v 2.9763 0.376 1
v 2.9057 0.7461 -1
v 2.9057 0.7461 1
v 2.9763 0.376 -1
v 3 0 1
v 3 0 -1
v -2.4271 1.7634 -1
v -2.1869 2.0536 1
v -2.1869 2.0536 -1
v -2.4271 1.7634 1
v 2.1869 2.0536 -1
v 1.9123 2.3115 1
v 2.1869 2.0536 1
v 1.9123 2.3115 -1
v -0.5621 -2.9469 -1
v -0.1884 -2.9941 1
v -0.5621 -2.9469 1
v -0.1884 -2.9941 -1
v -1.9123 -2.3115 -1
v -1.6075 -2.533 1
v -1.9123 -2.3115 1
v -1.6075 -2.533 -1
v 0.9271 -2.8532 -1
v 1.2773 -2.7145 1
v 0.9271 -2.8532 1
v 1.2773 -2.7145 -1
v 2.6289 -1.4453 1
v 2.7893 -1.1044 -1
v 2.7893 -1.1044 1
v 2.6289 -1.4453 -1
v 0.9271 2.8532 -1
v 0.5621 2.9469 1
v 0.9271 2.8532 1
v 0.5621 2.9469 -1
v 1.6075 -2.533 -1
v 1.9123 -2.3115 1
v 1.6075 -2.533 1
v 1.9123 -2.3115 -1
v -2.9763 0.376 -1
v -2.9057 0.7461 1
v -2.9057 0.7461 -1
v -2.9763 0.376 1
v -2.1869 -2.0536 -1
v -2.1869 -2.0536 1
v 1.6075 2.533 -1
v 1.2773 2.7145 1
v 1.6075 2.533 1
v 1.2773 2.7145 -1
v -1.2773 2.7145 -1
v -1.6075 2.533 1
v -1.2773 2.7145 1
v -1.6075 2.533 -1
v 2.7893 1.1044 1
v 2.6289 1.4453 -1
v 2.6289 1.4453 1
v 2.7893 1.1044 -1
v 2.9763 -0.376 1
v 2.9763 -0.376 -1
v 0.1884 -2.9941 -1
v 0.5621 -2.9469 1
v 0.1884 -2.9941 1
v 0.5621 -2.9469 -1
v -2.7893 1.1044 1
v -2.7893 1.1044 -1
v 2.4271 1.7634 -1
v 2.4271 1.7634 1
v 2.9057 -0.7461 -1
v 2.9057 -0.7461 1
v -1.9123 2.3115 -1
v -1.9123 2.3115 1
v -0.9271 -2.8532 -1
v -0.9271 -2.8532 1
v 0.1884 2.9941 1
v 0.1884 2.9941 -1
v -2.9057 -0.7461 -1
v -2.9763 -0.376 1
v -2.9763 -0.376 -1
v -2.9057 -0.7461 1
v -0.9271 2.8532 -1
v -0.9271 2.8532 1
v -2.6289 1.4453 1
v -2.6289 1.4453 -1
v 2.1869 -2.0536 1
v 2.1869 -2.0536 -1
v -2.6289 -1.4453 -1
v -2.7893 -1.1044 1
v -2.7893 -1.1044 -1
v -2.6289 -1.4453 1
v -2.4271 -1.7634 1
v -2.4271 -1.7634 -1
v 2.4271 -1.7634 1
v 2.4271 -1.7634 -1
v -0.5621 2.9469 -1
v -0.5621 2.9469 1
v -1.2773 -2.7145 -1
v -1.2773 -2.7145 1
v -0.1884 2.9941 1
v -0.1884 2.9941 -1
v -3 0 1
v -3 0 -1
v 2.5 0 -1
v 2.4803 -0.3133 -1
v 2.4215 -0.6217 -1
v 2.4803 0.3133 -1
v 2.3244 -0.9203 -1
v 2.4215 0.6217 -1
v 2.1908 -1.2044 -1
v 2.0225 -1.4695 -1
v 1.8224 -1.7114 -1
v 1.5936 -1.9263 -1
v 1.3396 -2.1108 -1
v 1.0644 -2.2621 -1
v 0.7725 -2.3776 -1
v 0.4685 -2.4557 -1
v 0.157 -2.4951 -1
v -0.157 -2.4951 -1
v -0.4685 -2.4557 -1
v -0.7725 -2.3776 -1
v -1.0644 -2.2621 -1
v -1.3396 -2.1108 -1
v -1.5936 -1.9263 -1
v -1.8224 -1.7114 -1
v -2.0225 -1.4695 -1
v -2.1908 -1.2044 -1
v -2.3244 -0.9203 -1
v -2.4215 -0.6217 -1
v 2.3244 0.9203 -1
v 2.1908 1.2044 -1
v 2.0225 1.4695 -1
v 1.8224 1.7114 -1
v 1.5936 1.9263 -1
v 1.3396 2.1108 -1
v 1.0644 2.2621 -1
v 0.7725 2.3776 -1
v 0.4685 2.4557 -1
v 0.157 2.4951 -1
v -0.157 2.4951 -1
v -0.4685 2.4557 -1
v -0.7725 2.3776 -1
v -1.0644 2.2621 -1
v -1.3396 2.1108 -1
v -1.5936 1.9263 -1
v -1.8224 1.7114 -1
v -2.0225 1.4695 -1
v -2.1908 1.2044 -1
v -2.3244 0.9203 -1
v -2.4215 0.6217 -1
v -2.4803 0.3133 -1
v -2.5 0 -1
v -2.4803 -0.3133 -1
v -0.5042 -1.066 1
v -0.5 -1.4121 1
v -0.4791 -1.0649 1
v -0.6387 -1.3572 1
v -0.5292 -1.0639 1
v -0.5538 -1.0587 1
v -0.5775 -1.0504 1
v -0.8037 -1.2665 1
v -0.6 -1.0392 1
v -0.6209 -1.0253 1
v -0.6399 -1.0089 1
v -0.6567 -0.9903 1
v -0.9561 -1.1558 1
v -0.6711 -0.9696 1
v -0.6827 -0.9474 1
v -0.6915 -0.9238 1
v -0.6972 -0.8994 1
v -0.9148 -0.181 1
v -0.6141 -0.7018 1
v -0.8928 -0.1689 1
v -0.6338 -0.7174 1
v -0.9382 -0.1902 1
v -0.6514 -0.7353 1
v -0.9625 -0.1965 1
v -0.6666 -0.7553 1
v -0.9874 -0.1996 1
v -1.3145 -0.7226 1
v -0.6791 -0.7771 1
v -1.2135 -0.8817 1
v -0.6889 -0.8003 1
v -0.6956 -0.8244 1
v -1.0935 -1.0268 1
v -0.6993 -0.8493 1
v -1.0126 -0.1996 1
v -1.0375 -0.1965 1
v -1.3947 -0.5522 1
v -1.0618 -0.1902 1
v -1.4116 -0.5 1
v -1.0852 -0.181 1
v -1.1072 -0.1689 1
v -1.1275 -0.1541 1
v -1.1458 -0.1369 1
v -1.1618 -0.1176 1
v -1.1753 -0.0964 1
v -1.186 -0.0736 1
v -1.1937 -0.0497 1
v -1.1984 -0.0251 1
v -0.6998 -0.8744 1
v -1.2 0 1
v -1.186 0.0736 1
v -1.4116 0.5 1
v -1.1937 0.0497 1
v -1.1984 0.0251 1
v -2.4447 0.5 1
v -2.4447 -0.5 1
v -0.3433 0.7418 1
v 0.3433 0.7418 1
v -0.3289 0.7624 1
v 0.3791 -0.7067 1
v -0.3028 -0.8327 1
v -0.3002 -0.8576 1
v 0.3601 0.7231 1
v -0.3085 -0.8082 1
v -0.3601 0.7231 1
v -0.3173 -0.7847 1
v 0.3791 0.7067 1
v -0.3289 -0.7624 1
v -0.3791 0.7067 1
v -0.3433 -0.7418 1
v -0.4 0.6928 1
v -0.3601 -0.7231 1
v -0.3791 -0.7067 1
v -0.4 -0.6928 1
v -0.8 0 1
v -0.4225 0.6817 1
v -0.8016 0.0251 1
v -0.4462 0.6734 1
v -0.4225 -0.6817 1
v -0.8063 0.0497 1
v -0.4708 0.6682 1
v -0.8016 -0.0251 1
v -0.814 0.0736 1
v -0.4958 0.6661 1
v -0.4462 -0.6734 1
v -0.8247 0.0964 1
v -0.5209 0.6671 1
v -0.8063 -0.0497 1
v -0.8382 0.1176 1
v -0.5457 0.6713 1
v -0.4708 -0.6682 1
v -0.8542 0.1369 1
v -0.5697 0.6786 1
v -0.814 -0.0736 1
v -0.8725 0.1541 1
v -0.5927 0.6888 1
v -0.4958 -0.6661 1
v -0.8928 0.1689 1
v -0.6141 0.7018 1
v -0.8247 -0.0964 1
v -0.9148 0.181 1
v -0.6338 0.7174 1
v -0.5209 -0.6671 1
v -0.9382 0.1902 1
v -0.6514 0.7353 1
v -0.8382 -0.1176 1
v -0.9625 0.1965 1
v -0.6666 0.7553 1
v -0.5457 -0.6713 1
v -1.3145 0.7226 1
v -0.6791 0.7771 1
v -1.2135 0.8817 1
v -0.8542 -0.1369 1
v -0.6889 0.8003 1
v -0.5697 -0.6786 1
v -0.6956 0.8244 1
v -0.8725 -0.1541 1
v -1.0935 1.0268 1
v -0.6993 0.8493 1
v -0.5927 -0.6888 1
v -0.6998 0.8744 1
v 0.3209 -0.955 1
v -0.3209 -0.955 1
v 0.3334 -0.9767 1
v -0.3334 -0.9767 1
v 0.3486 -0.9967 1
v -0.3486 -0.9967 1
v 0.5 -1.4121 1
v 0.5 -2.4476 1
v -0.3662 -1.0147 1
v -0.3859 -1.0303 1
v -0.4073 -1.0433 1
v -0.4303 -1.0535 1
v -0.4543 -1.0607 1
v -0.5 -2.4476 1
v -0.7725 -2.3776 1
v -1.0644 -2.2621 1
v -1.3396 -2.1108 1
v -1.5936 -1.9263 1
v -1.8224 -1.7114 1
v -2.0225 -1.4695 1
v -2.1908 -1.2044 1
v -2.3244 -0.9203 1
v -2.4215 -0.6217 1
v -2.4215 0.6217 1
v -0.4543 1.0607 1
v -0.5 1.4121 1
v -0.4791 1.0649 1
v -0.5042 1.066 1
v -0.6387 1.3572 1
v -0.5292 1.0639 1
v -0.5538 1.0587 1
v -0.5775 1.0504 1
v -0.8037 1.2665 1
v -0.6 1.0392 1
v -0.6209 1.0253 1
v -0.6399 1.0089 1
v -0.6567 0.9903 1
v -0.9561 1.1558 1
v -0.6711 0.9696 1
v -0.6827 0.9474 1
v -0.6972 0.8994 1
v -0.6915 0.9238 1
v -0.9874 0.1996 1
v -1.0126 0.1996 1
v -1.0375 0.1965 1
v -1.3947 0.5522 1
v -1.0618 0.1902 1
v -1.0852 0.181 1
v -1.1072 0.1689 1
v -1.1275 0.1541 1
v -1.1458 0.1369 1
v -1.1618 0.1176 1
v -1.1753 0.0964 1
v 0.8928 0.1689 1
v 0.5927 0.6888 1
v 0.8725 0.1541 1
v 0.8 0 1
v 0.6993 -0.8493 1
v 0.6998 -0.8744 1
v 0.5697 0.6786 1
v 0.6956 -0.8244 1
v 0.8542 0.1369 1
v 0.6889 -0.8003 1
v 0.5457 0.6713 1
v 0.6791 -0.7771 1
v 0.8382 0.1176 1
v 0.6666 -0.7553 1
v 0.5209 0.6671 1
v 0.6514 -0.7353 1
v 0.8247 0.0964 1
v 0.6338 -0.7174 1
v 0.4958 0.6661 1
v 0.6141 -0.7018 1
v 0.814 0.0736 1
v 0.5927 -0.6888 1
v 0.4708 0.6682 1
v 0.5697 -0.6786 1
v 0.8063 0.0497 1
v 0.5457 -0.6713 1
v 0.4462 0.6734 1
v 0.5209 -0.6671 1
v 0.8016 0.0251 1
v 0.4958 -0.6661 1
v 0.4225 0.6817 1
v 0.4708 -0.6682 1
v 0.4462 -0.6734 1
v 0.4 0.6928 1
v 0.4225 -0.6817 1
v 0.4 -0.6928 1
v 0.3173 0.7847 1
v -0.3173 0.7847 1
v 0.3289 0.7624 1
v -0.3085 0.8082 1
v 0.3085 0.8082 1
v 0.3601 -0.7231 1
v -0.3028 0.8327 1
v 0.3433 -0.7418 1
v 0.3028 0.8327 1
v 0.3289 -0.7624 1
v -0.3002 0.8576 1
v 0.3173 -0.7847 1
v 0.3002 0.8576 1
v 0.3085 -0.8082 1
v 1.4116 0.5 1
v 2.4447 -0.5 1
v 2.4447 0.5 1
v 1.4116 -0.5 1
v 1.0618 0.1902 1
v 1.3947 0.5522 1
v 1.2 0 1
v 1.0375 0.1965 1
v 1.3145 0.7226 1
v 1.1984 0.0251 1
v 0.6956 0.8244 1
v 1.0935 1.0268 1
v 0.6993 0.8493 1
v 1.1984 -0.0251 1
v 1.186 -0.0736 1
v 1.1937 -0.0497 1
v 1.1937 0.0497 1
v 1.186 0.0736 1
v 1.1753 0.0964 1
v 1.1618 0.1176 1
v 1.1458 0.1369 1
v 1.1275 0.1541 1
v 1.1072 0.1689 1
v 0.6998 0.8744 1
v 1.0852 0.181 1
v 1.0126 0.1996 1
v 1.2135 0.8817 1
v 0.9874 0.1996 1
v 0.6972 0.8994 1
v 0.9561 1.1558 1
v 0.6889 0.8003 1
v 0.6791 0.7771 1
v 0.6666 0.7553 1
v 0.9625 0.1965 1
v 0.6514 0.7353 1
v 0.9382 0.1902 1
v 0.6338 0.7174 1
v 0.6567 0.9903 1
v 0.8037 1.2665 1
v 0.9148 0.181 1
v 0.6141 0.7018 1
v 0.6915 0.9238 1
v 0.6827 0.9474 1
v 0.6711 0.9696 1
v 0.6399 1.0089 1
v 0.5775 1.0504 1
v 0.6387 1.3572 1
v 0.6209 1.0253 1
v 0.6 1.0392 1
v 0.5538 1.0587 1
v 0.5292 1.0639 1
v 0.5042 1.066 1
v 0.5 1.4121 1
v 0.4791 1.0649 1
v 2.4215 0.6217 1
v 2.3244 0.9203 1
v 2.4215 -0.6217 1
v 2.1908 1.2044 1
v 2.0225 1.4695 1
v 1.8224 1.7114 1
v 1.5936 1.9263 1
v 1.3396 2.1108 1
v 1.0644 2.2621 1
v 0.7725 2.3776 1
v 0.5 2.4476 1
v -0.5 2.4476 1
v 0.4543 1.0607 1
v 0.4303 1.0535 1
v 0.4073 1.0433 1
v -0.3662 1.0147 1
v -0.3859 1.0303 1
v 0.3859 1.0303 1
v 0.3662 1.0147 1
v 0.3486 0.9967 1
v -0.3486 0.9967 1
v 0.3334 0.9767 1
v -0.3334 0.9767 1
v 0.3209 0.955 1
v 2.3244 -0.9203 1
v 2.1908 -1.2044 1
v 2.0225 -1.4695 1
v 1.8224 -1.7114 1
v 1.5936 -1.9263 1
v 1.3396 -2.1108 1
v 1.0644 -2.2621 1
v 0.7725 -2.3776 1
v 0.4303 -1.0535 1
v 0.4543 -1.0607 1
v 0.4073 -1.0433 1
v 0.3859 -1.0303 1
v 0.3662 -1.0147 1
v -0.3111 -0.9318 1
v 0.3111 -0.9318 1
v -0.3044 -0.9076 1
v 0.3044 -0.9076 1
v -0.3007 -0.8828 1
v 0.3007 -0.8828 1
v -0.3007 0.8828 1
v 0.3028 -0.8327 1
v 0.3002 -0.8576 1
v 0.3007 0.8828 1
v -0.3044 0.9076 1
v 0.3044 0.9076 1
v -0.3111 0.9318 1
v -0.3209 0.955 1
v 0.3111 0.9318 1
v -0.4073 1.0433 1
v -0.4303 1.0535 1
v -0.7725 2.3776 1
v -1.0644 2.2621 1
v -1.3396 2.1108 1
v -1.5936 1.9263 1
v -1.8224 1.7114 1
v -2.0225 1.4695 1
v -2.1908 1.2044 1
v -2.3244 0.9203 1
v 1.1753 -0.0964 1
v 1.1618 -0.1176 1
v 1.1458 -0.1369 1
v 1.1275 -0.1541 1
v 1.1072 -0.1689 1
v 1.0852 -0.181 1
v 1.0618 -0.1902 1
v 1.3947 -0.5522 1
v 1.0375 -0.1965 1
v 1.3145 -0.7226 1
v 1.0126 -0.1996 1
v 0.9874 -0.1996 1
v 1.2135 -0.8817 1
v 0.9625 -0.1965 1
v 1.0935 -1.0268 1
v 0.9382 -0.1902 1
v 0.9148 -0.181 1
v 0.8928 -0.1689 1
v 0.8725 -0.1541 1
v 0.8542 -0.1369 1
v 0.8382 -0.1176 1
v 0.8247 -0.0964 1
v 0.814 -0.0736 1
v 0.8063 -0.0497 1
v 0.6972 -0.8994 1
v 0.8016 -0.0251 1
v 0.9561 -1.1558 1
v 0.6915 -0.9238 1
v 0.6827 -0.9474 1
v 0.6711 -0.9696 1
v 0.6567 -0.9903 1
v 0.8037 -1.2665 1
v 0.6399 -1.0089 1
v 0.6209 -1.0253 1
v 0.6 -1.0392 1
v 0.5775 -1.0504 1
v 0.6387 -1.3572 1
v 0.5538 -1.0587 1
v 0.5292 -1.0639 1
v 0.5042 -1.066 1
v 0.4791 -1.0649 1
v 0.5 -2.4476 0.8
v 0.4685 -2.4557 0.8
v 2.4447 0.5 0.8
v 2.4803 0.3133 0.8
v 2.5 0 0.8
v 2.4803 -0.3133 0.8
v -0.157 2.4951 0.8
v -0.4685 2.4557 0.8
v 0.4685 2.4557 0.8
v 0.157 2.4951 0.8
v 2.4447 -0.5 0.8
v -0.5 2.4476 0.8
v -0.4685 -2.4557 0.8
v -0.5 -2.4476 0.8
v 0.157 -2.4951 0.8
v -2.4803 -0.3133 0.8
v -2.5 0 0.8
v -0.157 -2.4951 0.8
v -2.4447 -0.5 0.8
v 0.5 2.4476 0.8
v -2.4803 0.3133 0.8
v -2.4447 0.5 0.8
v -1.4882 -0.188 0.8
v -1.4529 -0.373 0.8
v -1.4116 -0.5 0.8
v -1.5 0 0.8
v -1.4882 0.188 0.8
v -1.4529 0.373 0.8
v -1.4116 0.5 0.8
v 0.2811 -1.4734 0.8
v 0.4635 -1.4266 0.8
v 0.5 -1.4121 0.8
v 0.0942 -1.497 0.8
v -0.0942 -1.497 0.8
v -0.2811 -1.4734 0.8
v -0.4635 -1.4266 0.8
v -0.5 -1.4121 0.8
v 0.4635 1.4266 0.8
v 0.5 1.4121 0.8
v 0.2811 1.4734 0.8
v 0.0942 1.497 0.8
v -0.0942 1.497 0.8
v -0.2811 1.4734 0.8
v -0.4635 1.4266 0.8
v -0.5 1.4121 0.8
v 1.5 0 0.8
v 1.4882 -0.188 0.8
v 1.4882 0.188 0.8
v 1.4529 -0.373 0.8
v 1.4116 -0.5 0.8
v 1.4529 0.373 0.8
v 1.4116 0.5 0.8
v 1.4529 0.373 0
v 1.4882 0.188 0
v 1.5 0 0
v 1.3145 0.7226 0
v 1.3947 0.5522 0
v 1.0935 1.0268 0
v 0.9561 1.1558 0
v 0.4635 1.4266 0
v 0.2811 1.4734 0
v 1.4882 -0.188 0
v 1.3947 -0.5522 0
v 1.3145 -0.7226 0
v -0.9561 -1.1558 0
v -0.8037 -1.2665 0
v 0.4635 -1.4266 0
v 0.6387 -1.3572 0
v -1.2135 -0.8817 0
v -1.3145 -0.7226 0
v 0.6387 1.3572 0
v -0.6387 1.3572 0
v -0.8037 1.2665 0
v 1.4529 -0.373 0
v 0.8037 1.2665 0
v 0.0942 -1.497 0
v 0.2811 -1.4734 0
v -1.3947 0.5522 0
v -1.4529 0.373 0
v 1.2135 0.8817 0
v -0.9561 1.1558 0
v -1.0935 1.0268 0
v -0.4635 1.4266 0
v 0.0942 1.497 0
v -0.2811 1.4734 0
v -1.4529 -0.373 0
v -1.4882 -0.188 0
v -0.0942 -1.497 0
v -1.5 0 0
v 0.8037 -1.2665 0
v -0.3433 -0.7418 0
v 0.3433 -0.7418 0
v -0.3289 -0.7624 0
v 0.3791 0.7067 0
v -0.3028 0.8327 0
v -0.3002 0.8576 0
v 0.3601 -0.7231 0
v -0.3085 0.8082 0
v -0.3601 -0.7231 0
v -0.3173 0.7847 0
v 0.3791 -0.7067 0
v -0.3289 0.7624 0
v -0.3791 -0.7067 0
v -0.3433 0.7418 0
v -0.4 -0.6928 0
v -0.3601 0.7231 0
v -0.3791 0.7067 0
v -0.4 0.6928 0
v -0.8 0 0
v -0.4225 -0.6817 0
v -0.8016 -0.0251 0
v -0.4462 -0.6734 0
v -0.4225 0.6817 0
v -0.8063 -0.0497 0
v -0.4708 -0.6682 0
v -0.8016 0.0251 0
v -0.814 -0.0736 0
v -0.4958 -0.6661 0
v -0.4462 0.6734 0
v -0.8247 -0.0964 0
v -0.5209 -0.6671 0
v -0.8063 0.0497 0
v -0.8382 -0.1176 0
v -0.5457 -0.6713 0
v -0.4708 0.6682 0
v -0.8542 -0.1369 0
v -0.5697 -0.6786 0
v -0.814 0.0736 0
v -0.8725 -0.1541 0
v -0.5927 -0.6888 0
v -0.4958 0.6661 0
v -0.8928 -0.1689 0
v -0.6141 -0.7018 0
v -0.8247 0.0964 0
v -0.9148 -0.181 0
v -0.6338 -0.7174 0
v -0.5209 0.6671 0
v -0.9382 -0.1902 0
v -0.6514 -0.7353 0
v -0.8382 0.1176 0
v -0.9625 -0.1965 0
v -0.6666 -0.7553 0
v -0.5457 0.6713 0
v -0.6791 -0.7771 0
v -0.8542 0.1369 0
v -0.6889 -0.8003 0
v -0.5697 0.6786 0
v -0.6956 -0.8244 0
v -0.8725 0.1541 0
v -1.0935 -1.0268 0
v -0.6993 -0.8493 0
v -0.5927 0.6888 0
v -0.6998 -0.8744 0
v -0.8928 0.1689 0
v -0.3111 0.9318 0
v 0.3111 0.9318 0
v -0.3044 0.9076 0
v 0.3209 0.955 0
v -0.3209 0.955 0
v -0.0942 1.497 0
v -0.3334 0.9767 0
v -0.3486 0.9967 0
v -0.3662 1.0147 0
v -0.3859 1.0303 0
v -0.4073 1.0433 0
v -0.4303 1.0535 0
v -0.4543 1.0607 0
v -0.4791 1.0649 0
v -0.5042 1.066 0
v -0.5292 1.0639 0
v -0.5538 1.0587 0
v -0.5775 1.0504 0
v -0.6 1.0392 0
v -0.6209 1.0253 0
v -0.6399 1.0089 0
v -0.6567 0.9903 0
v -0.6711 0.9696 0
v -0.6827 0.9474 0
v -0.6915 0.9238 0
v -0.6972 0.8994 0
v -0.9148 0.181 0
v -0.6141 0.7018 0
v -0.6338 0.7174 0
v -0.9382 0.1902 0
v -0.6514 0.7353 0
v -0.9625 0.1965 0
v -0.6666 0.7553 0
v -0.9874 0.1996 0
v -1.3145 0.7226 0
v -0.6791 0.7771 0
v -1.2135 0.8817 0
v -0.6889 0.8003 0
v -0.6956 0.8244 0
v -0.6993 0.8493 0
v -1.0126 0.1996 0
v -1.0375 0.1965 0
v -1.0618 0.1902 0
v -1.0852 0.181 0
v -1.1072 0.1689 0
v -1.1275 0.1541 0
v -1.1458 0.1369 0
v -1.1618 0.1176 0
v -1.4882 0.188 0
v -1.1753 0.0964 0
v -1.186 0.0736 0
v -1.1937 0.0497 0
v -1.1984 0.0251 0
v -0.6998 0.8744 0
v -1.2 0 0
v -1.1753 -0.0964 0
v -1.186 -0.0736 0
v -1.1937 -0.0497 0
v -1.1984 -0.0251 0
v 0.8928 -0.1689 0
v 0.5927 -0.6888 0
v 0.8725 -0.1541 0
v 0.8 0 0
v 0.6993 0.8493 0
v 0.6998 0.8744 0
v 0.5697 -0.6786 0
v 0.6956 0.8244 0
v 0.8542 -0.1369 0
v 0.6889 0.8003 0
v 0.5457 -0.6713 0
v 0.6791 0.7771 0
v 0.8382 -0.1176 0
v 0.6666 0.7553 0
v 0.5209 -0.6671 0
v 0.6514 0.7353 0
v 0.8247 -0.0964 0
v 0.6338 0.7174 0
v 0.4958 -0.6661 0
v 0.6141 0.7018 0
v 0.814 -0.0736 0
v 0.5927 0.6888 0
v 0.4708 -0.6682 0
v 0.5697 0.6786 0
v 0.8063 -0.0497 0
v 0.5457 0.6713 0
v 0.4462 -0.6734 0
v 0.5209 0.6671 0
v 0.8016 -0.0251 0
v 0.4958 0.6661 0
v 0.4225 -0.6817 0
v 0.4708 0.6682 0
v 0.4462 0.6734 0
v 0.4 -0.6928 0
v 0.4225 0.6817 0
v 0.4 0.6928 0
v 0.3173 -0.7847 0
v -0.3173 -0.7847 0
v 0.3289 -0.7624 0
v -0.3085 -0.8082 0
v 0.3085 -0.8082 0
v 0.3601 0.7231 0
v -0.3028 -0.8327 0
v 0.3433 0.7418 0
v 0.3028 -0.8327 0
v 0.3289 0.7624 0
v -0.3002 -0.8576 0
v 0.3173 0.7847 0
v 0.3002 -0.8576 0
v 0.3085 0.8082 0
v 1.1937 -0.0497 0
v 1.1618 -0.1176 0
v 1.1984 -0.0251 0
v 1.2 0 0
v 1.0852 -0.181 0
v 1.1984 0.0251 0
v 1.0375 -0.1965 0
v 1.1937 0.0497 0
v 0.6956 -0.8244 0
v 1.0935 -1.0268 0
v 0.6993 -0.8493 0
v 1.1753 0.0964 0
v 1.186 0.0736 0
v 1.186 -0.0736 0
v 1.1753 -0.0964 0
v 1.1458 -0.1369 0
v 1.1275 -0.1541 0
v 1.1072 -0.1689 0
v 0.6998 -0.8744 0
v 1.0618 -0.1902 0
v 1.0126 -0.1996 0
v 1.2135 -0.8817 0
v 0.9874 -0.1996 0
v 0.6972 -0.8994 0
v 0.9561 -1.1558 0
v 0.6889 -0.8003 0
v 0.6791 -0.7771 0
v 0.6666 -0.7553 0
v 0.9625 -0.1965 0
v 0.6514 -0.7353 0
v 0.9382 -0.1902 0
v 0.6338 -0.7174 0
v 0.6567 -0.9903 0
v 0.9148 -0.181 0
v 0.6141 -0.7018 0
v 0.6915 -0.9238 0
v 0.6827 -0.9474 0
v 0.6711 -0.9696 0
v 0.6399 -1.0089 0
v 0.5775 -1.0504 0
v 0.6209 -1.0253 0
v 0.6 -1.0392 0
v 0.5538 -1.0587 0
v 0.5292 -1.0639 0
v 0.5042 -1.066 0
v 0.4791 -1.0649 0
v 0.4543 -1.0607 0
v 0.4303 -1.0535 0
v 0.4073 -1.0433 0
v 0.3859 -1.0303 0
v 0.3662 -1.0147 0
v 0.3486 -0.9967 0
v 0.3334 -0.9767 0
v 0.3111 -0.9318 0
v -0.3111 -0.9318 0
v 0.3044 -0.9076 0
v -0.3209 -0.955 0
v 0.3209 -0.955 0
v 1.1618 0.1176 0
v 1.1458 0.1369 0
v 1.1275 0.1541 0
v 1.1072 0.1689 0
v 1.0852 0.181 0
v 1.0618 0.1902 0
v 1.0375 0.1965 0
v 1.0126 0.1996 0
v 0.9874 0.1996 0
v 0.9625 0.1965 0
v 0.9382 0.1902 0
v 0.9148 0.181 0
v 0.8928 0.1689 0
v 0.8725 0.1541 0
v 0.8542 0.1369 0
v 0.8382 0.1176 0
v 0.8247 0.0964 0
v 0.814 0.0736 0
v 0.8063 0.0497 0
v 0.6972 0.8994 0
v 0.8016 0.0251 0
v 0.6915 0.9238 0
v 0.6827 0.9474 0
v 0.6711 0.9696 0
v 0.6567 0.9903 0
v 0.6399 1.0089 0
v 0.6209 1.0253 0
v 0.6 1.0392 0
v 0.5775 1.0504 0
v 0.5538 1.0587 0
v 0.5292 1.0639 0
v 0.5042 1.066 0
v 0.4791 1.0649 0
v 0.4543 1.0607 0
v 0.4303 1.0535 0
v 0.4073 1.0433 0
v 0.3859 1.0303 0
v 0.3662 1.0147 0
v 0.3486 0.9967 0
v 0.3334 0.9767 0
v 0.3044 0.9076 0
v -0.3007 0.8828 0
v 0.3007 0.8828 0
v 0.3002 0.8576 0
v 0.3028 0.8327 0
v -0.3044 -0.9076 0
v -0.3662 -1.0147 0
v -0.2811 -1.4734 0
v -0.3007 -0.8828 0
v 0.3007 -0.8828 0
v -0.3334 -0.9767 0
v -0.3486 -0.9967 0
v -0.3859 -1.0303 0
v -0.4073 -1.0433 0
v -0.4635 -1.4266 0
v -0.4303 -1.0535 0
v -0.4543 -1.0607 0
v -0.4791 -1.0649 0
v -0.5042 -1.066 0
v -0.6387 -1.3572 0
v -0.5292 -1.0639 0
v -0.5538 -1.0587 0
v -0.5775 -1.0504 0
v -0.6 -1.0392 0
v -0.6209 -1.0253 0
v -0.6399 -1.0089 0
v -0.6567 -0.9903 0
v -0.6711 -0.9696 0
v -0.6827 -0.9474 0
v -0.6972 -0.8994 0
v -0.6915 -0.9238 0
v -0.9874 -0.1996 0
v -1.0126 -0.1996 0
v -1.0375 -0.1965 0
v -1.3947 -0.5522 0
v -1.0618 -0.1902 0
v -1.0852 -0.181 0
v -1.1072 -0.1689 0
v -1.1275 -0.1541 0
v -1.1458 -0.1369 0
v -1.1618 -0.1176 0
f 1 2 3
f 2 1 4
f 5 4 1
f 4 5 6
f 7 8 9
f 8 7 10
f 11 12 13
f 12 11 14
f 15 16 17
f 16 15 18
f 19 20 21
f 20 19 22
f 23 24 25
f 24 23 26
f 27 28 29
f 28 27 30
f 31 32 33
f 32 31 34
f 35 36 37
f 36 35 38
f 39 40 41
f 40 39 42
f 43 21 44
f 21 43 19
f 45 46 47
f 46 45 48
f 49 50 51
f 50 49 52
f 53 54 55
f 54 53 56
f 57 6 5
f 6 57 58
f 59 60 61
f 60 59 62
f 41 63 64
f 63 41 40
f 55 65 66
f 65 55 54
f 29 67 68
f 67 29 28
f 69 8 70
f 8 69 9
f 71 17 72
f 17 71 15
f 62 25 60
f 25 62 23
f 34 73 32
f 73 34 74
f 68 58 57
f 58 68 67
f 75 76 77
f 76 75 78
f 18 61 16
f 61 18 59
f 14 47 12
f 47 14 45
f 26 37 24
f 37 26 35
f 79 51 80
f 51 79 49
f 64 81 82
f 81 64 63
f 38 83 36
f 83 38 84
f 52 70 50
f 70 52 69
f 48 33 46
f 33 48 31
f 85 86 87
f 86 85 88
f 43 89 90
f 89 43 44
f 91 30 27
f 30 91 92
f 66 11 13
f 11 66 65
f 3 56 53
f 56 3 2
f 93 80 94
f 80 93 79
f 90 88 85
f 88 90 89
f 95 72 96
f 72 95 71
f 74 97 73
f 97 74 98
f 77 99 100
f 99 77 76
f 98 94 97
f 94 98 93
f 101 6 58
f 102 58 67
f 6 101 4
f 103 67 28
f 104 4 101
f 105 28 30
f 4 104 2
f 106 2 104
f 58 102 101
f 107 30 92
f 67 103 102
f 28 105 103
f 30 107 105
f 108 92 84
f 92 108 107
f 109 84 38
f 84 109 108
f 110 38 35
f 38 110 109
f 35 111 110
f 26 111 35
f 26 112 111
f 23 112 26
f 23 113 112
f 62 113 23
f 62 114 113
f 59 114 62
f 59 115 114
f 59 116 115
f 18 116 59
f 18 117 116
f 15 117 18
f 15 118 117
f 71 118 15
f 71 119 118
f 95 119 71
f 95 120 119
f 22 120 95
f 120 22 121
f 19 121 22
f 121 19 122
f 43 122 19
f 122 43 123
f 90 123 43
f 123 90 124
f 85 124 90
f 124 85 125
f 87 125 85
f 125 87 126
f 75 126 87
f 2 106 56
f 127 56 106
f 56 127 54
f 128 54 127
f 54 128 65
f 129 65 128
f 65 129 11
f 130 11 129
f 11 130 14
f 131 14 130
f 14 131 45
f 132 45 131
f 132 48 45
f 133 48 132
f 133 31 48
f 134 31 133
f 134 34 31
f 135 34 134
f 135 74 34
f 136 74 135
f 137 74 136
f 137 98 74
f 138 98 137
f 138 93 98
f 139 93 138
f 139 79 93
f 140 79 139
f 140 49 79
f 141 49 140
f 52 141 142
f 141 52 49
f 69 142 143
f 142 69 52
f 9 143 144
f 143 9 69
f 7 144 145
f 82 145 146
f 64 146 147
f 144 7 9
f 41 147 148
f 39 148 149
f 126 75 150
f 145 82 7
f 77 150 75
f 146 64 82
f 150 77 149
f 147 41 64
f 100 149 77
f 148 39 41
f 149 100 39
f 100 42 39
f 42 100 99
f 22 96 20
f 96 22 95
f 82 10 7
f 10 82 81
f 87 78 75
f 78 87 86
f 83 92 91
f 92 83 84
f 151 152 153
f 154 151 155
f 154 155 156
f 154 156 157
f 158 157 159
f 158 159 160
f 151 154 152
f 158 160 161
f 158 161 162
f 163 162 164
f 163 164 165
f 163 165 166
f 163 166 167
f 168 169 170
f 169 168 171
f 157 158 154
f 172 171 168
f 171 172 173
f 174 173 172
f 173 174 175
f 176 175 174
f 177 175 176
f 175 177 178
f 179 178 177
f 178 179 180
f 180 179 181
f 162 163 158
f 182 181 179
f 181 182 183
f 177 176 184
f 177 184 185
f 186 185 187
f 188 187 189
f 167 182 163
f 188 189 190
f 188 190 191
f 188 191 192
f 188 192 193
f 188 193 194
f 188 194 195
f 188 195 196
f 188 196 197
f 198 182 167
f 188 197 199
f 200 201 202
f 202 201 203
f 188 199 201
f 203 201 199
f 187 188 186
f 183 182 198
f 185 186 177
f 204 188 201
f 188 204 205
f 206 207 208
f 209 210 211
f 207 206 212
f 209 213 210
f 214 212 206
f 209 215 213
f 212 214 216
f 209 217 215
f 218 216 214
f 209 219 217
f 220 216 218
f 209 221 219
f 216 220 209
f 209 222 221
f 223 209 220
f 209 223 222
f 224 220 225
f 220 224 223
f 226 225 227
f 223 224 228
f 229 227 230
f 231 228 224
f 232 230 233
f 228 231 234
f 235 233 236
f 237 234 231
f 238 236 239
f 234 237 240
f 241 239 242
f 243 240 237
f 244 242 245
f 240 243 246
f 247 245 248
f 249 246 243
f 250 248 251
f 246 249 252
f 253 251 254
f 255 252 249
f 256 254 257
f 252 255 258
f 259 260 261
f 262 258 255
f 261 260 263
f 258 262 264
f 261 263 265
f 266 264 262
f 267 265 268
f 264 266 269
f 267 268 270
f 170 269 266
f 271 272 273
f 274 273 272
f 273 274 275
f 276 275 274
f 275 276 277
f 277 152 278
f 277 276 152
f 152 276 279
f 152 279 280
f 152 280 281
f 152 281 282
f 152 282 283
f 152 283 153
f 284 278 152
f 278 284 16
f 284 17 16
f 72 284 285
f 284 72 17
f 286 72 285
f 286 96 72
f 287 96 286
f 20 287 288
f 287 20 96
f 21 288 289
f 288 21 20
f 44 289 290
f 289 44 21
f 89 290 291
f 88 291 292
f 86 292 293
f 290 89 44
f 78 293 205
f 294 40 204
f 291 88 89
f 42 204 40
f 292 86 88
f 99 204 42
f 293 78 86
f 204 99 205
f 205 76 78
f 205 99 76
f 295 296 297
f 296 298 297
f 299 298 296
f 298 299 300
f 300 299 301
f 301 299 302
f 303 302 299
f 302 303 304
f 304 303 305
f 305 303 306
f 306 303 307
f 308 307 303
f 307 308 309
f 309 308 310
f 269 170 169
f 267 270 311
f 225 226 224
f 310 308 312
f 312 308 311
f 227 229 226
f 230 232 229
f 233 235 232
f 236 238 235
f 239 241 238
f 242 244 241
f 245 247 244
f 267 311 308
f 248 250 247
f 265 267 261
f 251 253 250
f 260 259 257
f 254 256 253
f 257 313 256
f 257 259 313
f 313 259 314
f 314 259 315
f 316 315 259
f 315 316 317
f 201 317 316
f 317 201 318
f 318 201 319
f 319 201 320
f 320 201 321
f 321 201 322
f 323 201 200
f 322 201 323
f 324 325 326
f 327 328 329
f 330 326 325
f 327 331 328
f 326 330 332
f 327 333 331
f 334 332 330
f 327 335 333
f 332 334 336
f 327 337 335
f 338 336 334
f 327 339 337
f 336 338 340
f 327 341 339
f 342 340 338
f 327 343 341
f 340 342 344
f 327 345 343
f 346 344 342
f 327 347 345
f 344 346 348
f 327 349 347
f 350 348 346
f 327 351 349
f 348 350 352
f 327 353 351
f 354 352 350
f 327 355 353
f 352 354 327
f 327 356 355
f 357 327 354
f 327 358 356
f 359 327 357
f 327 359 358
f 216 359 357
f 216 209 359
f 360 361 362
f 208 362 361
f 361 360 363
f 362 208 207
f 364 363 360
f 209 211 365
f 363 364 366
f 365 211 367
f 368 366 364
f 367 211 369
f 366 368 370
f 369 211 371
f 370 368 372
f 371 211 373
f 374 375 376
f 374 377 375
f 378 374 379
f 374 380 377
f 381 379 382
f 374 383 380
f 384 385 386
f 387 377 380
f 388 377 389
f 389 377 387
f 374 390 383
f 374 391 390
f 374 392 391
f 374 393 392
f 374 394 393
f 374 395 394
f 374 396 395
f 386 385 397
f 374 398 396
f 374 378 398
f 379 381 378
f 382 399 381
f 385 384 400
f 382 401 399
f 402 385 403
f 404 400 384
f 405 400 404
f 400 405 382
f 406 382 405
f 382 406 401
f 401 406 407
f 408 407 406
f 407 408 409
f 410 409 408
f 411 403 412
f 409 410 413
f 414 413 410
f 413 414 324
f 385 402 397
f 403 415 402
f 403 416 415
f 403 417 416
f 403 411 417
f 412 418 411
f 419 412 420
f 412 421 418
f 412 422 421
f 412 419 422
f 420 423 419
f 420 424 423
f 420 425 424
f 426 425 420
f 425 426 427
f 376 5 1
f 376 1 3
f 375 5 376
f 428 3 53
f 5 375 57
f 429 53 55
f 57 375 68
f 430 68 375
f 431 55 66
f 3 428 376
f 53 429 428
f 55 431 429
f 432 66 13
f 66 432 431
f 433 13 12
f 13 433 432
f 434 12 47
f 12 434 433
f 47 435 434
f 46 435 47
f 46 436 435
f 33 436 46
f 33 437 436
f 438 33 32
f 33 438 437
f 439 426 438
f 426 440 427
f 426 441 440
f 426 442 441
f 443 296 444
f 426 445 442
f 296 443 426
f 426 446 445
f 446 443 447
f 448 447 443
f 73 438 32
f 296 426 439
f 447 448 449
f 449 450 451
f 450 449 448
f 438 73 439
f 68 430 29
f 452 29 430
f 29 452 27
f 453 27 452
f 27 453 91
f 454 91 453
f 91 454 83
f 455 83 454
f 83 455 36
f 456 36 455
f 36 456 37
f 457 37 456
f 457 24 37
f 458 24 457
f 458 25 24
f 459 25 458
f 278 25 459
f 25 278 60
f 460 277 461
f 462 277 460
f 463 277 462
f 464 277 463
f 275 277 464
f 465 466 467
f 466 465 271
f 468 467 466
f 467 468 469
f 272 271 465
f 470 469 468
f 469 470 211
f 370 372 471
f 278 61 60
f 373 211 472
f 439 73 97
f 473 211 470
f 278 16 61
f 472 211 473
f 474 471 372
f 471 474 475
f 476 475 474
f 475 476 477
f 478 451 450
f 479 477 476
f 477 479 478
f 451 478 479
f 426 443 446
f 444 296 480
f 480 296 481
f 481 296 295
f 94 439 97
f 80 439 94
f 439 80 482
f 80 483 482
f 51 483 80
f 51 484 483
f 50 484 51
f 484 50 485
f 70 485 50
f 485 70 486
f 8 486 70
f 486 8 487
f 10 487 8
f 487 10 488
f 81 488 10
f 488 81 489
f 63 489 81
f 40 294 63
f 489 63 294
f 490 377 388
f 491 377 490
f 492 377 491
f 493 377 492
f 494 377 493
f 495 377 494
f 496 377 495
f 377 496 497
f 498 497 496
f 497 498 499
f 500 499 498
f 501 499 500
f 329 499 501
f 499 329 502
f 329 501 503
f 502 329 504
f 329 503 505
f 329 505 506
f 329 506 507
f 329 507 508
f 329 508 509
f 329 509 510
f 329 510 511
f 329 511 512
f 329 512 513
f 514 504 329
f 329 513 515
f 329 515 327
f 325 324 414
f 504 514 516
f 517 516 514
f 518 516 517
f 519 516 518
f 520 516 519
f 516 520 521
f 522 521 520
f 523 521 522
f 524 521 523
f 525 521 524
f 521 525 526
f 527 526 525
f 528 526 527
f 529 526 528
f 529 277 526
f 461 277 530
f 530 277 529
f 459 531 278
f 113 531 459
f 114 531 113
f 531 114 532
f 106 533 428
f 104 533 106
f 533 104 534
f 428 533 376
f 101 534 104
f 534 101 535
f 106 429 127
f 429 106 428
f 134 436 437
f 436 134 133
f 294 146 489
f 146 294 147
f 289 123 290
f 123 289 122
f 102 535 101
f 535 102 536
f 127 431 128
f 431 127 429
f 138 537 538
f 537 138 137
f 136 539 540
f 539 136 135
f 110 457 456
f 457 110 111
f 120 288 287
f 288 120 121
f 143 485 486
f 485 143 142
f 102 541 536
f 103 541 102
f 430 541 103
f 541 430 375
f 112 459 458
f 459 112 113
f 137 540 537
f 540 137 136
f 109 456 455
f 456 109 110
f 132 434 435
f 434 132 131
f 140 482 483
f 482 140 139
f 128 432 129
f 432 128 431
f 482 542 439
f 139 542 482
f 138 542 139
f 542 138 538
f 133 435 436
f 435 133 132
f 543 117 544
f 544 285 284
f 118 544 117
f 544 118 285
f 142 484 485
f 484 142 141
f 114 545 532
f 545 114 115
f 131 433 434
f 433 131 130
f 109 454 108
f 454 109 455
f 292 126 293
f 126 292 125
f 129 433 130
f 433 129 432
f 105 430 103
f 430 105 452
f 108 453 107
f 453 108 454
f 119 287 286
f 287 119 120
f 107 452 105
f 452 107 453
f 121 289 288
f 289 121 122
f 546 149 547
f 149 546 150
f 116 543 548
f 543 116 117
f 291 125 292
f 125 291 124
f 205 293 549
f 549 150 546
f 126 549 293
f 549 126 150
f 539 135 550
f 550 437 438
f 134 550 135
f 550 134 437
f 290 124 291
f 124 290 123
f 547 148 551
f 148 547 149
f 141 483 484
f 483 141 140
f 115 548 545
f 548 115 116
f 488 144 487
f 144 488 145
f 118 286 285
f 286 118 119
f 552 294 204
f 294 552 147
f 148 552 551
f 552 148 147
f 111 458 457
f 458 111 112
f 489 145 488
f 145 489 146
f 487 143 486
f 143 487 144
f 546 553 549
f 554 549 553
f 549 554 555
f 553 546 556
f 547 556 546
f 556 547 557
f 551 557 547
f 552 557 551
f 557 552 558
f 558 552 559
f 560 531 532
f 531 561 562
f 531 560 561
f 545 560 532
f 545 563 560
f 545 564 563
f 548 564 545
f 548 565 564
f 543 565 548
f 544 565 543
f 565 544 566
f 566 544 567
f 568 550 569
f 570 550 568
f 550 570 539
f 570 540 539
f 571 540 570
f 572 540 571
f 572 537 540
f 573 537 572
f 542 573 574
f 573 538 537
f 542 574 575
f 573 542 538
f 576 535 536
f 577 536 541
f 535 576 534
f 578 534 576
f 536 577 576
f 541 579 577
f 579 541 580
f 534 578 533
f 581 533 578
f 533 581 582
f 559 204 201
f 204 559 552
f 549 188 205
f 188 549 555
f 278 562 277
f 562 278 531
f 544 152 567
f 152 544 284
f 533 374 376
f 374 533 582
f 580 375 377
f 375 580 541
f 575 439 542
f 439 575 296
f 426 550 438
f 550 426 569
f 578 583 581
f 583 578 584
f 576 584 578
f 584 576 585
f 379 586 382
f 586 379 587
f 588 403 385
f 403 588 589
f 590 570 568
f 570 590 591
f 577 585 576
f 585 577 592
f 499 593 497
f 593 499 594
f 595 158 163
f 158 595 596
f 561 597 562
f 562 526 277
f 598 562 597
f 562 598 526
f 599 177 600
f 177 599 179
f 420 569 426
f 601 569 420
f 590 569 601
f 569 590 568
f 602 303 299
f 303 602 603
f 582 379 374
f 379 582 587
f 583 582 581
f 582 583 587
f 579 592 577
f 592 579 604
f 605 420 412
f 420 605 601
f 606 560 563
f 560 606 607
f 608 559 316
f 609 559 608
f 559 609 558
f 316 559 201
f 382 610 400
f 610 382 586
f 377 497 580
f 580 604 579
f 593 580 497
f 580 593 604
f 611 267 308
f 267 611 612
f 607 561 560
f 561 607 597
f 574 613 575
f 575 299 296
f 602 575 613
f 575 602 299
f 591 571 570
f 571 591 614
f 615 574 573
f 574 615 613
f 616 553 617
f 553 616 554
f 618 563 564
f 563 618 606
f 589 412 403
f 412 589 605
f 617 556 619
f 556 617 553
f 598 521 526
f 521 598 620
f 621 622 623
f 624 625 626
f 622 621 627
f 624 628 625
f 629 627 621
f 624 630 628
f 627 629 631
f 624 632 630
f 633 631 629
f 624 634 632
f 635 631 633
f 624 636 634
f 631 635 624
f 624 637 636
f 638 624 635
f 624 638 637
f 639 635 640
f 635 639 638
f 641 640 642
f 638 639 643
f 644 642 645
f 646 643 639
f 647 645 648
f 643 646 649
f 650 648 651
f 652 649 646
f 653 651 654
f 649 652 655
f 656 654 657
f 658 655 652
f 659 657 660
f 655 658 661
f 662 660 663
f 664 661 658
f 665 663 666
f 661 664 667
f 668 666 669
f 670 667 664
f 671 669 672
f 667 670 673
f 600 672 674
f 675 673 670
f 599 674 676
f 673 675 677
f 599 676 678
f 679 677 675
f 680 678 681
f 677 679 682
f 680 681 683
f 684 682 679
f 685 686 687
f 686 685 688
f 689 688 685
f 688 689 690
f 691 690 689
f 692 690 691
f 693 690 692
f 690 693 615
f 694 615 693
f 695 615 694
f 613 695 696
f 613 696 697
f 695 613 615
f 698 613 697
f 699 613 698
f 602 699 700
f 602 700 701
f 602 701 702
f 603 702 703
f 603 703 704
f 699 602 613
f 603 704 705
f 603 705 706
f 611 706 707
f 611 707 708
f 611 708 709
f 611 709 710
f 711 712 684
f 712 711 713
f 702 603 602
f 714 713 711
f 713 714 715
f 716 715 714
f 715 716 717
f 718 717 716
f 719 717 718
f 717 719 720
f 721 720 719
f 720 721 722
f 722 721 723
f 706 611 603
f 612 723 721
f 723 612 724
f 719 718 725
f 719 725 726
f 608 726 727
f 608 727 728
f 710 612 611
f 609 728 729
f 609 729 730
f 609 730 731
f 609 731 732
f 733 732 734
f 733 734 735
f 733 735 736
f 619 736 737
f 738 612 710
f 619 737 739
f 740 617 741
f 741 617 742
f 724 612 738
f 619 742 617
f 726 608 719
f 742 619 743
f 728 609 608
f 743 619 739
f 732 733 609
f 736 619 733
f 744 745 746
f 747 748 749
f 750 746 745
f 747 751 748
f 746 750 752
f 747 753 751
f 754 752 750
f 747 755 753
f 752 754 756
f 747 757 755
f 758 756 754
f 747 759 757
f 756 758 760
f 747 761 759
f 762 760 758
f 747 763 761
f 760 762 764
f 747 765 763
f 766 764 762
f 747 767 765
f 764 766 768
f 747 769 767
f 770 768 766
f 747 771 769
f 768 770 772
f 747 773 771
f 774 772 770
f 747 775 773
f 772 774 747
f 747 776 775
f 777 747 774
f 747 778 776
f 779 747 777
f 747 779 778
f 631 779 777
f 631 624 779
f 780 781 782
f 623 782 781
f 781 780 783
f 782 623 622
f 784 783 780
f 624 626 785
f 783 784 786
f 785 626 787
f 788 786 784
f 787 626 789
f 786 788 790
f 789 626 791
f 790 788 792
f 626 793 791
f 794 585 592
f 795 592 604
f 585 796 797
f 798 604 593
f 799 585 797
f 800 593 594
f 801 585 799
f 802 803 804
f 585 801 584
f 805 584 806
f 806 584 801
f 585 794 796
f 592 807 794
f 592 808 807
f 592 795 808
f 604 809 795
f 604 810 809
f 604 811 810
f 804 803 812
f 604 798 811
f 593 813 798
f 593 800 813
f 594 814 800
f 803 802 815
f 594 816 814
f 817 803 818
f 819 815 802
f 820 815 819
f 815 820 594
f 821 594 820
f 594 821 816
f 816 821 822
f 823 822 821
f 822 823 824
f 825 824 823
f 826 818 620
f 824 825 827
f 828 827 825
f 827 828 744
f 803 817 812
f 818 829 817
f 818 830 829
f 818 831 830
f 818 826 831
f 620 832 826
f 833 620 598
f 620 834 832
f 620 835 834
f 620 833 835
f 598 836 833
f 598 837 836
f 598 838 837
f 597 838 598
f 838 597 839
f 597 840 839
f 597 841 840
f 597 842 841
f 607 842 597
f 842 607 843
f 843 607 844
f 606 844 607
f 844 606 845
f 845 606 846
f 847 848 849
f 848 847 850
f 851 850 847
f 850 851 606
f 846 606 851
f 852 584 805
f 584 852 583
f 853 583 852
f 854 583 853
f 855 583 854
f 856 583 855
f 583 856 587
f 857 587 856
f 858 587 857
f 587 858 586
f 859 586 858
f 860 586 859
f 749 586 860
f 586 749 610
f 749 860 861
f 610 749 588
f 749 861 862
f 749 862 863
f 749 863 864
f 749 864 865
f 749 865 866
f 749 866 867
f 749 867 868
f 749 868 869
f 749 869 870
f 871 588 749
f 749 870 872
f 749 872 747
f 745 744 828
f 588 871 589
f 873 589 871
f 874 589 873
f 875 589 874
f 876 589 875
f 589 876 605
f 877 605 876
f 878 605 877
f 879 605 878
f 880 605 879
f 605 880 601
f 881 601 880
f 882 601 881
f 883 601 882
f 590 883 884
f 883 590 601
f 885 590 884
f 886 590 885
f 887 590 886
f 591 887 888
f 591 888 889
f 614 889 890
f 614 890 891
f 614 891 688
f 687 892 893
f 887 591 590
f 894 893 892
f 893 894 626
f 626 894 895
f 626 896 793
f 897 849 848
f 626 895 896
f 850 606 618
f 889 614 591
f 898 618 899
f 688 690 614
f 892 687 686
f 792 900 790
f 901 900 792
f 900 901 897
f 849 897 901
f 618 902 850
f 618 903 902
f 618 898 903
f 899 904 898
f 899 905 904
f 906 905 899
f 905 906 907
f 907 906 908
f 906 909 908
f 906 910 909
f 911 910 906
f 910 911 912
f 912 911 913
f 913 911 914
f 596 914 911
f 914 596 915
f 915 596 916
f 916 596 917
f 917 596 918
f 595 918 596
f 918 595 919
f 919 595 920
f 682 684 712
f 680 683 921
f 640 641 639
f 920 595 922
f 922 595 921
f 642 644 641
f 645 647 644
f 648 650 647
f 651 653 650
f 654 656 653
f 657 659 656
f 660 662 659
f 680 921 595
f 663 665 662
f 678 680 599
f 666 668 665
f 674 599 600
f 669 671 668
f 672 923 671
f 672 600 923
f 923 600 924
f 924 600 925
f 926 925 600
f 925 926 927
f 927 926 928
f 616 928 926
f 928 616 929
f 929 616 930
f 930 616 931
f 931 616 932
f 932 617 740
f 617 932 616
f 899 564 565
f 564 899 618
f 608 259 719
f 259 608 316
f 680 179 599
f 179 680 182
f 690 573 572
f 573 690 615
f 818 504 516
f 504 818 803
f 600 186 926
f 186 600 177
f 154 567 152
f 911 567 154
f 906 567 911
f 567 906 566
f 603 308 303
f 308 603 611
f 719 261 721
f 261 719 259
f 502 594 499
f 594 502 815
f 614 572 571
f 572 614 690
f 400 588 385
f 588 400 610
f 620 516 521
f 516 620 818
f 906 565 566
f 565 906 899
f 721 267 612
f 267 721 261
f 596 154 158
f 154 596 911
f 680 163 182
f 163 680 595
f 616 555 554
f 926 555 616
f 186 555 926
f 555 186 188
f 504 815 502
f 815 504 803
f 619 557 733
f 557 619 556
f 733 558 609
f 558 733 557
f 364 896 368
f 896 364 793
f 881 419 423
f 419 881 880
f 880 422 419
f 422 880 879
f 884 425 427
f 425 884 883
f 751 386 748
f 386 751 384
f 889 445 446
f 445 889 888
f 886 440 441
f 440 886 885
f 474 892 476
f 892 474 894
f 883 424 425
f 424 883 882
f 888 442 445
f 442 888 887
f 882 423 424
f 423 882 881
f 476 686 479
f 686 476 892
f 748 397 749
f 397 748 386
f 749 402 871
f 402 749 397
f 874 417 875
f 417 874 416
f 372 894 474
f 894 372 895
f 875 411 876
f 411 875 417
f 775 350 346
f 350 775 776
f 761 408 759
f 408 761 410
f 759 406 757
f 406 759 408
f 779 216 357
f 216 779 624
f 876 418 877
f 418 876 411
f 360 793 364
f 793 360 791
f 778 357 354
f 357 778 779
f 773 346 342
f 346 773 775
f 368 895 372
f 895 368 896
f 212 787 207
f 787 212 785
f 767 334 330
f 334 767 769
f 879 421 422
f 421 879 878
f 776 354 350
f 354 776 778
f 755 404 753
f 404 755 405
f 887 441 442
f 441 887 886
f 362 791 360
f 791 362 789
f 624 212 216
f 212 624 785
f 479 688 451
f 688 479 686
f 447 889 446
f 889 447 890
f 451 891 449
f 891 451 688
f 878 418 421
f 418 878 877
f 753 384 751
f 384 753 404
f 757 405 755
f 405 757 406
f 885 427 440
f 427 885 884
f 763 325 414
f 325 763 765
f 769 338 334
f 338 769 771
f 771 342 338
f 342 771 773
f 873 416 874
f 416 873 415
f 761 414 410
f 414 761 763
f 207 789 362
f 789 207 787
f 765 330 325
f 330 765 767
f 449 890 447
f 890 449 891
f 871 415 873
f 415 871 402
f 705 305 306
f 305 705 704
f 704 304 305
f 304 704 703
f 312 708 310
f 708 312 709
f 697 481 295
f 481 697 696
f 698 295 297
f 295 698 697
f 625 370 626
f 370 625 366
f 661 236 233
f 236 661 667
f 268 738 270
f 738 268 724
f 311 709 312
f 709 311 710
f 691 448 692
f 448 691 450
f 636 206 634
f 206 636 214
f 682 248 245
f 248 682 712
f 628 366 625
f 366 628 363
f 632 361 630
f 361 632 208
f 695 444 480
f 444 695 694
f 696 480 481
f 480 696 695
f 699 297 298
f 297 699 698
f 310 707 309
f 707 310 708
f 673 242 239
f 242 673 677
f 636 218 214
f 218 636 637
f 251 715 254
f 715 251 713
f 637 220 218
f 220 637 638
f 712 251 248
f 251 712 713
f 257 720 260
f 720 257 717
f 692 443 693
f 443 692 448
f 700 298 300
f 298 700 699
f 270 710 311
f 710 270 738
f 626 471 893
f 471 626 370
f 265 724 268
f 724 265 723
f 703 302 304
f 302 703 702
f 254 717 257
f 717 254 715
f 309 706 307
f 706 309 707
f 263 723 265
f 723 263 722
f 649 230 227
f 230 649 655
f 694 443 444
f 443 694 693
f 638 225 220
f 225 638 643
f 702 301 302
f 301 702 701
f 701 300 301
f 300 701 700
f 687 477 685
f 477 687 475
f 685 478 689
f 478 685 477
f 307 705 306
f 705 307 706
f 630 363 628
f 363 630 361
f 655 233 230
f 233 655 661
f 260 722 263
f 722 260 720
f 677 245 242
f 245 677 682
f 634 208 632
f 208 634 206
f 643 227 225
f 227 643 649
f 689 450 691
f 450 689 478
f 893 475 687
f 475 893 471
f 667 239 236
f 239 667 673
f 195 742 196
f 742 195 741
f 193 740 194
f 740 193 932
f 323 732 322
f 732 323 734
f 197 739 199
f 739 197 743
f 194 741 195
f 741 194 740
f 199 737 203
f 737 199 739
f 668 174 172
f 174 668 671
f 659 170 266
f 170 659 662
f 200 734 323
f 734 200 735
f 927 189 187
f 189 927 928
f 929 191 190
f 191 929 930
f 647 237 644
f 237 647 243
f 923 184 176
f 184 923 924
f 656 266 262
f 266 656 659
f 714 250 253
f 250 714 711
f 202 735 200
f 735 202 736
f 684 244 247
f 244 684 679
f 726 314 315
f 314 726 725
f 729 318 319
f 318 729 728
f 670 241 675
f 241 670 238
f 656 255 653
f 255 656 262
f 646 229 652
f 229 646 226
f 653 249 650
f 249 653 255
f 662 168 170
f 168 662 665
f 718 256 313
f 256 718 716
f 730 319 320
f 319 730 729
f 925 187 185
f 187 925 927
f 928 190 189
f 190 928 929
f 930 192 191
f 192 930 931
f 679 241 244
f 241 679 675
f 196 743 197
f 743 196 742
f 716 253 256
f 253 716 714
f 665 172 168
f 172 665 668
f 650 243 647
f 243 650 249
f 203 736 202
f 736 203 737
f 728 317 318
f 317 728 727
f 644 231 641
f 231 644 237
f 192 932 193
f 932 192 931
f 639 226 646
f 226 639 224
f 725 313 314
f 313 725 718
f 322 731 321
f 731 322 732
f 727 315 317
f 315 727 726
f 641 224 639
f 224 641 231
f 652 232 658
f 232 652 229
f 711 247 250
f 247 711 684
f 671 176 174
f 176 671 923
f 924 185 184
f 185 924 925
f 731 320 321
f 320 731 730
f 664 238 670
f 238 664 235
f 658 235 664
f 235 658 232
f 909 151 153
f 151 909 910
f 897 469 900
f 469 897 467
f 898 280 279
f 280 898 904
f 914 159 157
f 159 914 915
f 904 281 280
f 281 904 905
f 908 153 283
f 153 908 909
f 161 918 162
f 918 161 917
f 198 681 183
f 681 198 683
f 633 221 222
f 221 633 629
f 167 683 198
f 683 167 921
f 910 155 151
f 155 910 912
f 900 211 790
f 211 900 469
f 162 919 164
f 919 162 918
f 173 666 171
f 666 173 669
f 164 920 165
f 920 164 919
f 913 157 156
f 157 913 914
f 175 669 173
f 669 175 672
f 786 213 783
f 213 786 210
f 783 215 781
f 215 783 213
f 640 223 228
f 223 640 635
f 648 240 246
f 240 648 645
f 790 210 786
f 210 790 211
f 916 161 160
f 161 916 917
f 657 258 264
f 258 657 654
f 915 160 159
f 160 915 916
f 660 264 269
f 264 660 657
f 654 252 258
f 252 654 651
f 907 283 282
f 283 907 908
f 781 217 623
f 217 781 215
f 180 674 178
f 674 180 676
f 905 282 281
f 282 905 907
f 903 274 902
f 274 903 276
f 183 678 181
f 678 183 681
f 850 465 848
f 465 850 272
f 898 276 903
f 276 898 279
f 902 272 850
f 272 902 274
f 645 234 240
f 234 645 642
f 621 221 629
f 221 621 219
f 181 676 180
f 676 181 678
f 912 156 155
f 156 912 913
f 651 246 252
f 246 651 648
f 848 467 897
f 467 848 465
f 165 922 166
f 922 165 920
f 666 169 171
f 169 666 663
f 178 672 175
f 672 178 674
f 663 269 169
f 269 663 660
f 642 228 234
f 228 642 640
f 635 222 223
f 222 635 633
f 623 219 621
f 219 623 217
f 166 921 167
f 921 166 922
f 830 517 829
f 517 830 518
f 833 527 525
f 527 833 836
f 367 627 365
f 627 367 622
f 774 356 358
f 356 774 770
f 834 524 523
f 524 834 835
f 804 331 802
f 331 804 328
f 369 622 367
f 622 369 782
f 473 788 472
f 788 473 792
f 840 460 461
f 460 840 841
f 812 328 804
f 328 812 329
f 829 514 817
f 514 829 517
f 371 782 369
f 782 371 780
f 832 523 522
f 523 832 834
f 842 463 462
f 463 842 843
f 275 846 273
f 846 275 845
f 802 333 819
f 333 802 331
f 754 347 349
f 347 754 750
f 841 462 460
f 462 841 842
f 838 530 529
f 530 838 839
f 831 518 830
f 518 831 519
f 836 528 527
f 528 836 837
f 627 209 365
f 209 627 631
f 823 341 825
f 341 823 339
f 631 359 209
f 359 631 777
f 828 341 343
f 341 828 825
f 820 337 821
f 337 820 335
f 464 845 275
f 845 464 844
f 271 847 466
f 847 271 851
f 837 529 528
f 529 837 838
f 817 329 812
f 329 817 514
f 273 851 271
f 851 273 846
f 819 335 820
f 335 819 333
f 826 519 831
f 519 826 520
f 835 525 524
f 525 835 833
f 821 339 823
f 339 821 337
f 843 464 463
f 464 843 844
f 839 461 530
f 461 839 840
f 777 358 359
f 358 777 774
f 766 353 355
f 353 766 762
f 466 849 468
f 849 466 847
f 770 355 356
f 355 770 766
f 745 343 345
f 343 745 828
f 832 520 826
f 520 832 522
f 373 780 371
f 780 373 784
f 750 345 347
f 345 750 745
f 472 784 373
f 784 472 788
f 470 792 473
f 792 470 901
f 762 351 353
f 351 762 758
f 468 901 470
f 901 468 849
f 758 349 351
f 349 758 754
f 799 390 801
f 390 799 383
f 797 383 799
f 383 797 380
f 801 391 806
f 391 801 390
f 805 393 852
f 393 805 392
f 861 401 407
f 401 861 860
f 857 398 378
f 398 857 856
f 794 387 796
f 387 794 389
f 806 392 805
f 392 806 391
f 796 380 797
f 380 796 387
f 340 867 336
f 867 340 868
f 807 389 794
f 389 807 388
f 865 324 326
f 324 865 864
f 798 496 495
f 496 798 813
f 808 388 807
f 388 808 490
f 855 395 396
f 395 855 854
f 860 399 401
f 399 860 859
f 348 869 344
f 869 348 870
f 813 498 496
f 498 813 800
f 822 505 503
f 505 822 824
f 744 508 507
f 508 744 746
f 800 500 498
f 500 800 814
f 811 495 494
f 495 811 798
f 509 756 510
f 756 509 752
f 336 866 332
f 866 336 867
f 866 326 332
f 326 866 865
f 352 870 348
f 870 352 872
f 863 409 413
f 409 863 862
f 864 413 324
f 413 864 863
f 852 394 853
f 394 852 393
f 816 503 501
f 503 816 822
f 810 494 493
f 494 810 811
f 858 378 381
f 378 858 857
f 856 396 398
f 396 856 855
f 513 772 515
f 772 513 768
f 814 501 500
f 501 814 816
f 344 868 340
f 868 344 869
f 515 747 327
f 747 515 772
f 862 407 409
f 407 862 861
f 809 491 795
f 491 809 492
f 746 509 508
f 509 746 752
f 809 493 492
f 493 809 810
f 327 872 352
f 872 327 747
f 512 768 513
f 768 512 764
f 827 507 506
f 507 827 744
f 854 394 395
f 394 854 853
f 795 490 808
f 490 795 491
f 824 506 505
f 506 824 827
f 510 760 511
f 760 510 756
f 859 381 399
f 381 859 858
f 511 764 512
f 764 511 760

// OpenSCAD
//// VARIABLES ////

fc=360; // the number of degrees in a full circle

c=50; //polygon count

// GENERAL SIZE
h=2; //thickness of the wheel
r1=3; //radius of the wheel
r2=r1;

// LUGNUTS
lnr=0.2; //lugnut radius
lnh=h+1; //make sure the holes go through the whole wheel
lnfc=1; // distance of the lug nuts from the center of the wheel
lnn=6; //number of lug nuts
lnss=0.4; //additional radius around each lug nut saved

// SPOKES
sn=4; //number of spokes
sl=r1-0.7; //spoke length
sh=0.2; //spoke height
sd=0; //spoke distance from 'top' of wheel
sr=90; //roll angle of the spokes	default is 90 degrees
sy=90; //yaw angle of the spokes	default is 90 degrees

// HUB
cor=r1-0.5; //'chunk out' radius. FROM POLYGON POINTS OF OUTER PATTERN
//hr=(lnfc+lnr+lnss)/2;
hr=1.5; //hub radius
hh=1; //hub height

// OUTER PATTERN
//opo=[ //outer-wheel pattern where the tire will meet.
//	[0,	0],
//	[1.00*h,	0],
//	[0.90*h,	-0.15],
//	[0.50*h,	-0.15],
//	[0.40*h,	-0.40],
//	[0.20*h,	-0.40],
//	[0.15*h,	-0.25],
//	[0.12*h,	-0.25],
//	[0.05*h,	-0.05]];

op=[ h*[
0.00,
1.00,
0.90,
0.50,
0.40,
0.20,
0.15,
0.15,
0.05
],[
0,
-0.15,
-0.15,
-0.40,
-0.40,
-0.25,
-0.25,
-0.05] ];

lol=concat(op[0][1],op[1][1]);
lol2=concat(op[0][2],op[1][2]);
echo(lol,lol2);
loli=[lol,lol2];
echo(loli);

//// GENERATION CODE ////

union(){
	difference(){
		union(){
			cylinder(h,r1,r1,center=true,$fn=c); 			//Big Cylinder. Just about all the wheel is cut from this.
		}
		//}
//	rotate_extrude(convexity=c,$fn=c)
//		translate([r1,h/2,0])
//		rotate(270)
//		polygon(points=[op.x,op.y]);			//The outer pattern of the wheel that will be covered by the tire.
	//}
cylinder(lnh,cor,cor,center=true,$fn=c);
}

difference(){
	union(){
		translate([0,0,hh/2])
		cylinder(hh,hr,hr,center=true,$fn=c);					//Hub
		for (i=[1:sn])
		{
			rotate(a=[0,sr,(fc/sn)*i])//
				translate([-h/2+sh/2+sd,lnh/2,0]) //
				rotate(a=[sy,0,0])
				cube([sh,1,sl],center=true);				//Spokes
		}
	}
	for (i=[1:lnn])
	{
		rotate(a=[0,0,(fc/lnn)*i])
			translate([lnfc,0,0])
			cylinder(lnh,lnr,lnr,center=true,$fn=c);		//Lugnut holes
	}

}

}
